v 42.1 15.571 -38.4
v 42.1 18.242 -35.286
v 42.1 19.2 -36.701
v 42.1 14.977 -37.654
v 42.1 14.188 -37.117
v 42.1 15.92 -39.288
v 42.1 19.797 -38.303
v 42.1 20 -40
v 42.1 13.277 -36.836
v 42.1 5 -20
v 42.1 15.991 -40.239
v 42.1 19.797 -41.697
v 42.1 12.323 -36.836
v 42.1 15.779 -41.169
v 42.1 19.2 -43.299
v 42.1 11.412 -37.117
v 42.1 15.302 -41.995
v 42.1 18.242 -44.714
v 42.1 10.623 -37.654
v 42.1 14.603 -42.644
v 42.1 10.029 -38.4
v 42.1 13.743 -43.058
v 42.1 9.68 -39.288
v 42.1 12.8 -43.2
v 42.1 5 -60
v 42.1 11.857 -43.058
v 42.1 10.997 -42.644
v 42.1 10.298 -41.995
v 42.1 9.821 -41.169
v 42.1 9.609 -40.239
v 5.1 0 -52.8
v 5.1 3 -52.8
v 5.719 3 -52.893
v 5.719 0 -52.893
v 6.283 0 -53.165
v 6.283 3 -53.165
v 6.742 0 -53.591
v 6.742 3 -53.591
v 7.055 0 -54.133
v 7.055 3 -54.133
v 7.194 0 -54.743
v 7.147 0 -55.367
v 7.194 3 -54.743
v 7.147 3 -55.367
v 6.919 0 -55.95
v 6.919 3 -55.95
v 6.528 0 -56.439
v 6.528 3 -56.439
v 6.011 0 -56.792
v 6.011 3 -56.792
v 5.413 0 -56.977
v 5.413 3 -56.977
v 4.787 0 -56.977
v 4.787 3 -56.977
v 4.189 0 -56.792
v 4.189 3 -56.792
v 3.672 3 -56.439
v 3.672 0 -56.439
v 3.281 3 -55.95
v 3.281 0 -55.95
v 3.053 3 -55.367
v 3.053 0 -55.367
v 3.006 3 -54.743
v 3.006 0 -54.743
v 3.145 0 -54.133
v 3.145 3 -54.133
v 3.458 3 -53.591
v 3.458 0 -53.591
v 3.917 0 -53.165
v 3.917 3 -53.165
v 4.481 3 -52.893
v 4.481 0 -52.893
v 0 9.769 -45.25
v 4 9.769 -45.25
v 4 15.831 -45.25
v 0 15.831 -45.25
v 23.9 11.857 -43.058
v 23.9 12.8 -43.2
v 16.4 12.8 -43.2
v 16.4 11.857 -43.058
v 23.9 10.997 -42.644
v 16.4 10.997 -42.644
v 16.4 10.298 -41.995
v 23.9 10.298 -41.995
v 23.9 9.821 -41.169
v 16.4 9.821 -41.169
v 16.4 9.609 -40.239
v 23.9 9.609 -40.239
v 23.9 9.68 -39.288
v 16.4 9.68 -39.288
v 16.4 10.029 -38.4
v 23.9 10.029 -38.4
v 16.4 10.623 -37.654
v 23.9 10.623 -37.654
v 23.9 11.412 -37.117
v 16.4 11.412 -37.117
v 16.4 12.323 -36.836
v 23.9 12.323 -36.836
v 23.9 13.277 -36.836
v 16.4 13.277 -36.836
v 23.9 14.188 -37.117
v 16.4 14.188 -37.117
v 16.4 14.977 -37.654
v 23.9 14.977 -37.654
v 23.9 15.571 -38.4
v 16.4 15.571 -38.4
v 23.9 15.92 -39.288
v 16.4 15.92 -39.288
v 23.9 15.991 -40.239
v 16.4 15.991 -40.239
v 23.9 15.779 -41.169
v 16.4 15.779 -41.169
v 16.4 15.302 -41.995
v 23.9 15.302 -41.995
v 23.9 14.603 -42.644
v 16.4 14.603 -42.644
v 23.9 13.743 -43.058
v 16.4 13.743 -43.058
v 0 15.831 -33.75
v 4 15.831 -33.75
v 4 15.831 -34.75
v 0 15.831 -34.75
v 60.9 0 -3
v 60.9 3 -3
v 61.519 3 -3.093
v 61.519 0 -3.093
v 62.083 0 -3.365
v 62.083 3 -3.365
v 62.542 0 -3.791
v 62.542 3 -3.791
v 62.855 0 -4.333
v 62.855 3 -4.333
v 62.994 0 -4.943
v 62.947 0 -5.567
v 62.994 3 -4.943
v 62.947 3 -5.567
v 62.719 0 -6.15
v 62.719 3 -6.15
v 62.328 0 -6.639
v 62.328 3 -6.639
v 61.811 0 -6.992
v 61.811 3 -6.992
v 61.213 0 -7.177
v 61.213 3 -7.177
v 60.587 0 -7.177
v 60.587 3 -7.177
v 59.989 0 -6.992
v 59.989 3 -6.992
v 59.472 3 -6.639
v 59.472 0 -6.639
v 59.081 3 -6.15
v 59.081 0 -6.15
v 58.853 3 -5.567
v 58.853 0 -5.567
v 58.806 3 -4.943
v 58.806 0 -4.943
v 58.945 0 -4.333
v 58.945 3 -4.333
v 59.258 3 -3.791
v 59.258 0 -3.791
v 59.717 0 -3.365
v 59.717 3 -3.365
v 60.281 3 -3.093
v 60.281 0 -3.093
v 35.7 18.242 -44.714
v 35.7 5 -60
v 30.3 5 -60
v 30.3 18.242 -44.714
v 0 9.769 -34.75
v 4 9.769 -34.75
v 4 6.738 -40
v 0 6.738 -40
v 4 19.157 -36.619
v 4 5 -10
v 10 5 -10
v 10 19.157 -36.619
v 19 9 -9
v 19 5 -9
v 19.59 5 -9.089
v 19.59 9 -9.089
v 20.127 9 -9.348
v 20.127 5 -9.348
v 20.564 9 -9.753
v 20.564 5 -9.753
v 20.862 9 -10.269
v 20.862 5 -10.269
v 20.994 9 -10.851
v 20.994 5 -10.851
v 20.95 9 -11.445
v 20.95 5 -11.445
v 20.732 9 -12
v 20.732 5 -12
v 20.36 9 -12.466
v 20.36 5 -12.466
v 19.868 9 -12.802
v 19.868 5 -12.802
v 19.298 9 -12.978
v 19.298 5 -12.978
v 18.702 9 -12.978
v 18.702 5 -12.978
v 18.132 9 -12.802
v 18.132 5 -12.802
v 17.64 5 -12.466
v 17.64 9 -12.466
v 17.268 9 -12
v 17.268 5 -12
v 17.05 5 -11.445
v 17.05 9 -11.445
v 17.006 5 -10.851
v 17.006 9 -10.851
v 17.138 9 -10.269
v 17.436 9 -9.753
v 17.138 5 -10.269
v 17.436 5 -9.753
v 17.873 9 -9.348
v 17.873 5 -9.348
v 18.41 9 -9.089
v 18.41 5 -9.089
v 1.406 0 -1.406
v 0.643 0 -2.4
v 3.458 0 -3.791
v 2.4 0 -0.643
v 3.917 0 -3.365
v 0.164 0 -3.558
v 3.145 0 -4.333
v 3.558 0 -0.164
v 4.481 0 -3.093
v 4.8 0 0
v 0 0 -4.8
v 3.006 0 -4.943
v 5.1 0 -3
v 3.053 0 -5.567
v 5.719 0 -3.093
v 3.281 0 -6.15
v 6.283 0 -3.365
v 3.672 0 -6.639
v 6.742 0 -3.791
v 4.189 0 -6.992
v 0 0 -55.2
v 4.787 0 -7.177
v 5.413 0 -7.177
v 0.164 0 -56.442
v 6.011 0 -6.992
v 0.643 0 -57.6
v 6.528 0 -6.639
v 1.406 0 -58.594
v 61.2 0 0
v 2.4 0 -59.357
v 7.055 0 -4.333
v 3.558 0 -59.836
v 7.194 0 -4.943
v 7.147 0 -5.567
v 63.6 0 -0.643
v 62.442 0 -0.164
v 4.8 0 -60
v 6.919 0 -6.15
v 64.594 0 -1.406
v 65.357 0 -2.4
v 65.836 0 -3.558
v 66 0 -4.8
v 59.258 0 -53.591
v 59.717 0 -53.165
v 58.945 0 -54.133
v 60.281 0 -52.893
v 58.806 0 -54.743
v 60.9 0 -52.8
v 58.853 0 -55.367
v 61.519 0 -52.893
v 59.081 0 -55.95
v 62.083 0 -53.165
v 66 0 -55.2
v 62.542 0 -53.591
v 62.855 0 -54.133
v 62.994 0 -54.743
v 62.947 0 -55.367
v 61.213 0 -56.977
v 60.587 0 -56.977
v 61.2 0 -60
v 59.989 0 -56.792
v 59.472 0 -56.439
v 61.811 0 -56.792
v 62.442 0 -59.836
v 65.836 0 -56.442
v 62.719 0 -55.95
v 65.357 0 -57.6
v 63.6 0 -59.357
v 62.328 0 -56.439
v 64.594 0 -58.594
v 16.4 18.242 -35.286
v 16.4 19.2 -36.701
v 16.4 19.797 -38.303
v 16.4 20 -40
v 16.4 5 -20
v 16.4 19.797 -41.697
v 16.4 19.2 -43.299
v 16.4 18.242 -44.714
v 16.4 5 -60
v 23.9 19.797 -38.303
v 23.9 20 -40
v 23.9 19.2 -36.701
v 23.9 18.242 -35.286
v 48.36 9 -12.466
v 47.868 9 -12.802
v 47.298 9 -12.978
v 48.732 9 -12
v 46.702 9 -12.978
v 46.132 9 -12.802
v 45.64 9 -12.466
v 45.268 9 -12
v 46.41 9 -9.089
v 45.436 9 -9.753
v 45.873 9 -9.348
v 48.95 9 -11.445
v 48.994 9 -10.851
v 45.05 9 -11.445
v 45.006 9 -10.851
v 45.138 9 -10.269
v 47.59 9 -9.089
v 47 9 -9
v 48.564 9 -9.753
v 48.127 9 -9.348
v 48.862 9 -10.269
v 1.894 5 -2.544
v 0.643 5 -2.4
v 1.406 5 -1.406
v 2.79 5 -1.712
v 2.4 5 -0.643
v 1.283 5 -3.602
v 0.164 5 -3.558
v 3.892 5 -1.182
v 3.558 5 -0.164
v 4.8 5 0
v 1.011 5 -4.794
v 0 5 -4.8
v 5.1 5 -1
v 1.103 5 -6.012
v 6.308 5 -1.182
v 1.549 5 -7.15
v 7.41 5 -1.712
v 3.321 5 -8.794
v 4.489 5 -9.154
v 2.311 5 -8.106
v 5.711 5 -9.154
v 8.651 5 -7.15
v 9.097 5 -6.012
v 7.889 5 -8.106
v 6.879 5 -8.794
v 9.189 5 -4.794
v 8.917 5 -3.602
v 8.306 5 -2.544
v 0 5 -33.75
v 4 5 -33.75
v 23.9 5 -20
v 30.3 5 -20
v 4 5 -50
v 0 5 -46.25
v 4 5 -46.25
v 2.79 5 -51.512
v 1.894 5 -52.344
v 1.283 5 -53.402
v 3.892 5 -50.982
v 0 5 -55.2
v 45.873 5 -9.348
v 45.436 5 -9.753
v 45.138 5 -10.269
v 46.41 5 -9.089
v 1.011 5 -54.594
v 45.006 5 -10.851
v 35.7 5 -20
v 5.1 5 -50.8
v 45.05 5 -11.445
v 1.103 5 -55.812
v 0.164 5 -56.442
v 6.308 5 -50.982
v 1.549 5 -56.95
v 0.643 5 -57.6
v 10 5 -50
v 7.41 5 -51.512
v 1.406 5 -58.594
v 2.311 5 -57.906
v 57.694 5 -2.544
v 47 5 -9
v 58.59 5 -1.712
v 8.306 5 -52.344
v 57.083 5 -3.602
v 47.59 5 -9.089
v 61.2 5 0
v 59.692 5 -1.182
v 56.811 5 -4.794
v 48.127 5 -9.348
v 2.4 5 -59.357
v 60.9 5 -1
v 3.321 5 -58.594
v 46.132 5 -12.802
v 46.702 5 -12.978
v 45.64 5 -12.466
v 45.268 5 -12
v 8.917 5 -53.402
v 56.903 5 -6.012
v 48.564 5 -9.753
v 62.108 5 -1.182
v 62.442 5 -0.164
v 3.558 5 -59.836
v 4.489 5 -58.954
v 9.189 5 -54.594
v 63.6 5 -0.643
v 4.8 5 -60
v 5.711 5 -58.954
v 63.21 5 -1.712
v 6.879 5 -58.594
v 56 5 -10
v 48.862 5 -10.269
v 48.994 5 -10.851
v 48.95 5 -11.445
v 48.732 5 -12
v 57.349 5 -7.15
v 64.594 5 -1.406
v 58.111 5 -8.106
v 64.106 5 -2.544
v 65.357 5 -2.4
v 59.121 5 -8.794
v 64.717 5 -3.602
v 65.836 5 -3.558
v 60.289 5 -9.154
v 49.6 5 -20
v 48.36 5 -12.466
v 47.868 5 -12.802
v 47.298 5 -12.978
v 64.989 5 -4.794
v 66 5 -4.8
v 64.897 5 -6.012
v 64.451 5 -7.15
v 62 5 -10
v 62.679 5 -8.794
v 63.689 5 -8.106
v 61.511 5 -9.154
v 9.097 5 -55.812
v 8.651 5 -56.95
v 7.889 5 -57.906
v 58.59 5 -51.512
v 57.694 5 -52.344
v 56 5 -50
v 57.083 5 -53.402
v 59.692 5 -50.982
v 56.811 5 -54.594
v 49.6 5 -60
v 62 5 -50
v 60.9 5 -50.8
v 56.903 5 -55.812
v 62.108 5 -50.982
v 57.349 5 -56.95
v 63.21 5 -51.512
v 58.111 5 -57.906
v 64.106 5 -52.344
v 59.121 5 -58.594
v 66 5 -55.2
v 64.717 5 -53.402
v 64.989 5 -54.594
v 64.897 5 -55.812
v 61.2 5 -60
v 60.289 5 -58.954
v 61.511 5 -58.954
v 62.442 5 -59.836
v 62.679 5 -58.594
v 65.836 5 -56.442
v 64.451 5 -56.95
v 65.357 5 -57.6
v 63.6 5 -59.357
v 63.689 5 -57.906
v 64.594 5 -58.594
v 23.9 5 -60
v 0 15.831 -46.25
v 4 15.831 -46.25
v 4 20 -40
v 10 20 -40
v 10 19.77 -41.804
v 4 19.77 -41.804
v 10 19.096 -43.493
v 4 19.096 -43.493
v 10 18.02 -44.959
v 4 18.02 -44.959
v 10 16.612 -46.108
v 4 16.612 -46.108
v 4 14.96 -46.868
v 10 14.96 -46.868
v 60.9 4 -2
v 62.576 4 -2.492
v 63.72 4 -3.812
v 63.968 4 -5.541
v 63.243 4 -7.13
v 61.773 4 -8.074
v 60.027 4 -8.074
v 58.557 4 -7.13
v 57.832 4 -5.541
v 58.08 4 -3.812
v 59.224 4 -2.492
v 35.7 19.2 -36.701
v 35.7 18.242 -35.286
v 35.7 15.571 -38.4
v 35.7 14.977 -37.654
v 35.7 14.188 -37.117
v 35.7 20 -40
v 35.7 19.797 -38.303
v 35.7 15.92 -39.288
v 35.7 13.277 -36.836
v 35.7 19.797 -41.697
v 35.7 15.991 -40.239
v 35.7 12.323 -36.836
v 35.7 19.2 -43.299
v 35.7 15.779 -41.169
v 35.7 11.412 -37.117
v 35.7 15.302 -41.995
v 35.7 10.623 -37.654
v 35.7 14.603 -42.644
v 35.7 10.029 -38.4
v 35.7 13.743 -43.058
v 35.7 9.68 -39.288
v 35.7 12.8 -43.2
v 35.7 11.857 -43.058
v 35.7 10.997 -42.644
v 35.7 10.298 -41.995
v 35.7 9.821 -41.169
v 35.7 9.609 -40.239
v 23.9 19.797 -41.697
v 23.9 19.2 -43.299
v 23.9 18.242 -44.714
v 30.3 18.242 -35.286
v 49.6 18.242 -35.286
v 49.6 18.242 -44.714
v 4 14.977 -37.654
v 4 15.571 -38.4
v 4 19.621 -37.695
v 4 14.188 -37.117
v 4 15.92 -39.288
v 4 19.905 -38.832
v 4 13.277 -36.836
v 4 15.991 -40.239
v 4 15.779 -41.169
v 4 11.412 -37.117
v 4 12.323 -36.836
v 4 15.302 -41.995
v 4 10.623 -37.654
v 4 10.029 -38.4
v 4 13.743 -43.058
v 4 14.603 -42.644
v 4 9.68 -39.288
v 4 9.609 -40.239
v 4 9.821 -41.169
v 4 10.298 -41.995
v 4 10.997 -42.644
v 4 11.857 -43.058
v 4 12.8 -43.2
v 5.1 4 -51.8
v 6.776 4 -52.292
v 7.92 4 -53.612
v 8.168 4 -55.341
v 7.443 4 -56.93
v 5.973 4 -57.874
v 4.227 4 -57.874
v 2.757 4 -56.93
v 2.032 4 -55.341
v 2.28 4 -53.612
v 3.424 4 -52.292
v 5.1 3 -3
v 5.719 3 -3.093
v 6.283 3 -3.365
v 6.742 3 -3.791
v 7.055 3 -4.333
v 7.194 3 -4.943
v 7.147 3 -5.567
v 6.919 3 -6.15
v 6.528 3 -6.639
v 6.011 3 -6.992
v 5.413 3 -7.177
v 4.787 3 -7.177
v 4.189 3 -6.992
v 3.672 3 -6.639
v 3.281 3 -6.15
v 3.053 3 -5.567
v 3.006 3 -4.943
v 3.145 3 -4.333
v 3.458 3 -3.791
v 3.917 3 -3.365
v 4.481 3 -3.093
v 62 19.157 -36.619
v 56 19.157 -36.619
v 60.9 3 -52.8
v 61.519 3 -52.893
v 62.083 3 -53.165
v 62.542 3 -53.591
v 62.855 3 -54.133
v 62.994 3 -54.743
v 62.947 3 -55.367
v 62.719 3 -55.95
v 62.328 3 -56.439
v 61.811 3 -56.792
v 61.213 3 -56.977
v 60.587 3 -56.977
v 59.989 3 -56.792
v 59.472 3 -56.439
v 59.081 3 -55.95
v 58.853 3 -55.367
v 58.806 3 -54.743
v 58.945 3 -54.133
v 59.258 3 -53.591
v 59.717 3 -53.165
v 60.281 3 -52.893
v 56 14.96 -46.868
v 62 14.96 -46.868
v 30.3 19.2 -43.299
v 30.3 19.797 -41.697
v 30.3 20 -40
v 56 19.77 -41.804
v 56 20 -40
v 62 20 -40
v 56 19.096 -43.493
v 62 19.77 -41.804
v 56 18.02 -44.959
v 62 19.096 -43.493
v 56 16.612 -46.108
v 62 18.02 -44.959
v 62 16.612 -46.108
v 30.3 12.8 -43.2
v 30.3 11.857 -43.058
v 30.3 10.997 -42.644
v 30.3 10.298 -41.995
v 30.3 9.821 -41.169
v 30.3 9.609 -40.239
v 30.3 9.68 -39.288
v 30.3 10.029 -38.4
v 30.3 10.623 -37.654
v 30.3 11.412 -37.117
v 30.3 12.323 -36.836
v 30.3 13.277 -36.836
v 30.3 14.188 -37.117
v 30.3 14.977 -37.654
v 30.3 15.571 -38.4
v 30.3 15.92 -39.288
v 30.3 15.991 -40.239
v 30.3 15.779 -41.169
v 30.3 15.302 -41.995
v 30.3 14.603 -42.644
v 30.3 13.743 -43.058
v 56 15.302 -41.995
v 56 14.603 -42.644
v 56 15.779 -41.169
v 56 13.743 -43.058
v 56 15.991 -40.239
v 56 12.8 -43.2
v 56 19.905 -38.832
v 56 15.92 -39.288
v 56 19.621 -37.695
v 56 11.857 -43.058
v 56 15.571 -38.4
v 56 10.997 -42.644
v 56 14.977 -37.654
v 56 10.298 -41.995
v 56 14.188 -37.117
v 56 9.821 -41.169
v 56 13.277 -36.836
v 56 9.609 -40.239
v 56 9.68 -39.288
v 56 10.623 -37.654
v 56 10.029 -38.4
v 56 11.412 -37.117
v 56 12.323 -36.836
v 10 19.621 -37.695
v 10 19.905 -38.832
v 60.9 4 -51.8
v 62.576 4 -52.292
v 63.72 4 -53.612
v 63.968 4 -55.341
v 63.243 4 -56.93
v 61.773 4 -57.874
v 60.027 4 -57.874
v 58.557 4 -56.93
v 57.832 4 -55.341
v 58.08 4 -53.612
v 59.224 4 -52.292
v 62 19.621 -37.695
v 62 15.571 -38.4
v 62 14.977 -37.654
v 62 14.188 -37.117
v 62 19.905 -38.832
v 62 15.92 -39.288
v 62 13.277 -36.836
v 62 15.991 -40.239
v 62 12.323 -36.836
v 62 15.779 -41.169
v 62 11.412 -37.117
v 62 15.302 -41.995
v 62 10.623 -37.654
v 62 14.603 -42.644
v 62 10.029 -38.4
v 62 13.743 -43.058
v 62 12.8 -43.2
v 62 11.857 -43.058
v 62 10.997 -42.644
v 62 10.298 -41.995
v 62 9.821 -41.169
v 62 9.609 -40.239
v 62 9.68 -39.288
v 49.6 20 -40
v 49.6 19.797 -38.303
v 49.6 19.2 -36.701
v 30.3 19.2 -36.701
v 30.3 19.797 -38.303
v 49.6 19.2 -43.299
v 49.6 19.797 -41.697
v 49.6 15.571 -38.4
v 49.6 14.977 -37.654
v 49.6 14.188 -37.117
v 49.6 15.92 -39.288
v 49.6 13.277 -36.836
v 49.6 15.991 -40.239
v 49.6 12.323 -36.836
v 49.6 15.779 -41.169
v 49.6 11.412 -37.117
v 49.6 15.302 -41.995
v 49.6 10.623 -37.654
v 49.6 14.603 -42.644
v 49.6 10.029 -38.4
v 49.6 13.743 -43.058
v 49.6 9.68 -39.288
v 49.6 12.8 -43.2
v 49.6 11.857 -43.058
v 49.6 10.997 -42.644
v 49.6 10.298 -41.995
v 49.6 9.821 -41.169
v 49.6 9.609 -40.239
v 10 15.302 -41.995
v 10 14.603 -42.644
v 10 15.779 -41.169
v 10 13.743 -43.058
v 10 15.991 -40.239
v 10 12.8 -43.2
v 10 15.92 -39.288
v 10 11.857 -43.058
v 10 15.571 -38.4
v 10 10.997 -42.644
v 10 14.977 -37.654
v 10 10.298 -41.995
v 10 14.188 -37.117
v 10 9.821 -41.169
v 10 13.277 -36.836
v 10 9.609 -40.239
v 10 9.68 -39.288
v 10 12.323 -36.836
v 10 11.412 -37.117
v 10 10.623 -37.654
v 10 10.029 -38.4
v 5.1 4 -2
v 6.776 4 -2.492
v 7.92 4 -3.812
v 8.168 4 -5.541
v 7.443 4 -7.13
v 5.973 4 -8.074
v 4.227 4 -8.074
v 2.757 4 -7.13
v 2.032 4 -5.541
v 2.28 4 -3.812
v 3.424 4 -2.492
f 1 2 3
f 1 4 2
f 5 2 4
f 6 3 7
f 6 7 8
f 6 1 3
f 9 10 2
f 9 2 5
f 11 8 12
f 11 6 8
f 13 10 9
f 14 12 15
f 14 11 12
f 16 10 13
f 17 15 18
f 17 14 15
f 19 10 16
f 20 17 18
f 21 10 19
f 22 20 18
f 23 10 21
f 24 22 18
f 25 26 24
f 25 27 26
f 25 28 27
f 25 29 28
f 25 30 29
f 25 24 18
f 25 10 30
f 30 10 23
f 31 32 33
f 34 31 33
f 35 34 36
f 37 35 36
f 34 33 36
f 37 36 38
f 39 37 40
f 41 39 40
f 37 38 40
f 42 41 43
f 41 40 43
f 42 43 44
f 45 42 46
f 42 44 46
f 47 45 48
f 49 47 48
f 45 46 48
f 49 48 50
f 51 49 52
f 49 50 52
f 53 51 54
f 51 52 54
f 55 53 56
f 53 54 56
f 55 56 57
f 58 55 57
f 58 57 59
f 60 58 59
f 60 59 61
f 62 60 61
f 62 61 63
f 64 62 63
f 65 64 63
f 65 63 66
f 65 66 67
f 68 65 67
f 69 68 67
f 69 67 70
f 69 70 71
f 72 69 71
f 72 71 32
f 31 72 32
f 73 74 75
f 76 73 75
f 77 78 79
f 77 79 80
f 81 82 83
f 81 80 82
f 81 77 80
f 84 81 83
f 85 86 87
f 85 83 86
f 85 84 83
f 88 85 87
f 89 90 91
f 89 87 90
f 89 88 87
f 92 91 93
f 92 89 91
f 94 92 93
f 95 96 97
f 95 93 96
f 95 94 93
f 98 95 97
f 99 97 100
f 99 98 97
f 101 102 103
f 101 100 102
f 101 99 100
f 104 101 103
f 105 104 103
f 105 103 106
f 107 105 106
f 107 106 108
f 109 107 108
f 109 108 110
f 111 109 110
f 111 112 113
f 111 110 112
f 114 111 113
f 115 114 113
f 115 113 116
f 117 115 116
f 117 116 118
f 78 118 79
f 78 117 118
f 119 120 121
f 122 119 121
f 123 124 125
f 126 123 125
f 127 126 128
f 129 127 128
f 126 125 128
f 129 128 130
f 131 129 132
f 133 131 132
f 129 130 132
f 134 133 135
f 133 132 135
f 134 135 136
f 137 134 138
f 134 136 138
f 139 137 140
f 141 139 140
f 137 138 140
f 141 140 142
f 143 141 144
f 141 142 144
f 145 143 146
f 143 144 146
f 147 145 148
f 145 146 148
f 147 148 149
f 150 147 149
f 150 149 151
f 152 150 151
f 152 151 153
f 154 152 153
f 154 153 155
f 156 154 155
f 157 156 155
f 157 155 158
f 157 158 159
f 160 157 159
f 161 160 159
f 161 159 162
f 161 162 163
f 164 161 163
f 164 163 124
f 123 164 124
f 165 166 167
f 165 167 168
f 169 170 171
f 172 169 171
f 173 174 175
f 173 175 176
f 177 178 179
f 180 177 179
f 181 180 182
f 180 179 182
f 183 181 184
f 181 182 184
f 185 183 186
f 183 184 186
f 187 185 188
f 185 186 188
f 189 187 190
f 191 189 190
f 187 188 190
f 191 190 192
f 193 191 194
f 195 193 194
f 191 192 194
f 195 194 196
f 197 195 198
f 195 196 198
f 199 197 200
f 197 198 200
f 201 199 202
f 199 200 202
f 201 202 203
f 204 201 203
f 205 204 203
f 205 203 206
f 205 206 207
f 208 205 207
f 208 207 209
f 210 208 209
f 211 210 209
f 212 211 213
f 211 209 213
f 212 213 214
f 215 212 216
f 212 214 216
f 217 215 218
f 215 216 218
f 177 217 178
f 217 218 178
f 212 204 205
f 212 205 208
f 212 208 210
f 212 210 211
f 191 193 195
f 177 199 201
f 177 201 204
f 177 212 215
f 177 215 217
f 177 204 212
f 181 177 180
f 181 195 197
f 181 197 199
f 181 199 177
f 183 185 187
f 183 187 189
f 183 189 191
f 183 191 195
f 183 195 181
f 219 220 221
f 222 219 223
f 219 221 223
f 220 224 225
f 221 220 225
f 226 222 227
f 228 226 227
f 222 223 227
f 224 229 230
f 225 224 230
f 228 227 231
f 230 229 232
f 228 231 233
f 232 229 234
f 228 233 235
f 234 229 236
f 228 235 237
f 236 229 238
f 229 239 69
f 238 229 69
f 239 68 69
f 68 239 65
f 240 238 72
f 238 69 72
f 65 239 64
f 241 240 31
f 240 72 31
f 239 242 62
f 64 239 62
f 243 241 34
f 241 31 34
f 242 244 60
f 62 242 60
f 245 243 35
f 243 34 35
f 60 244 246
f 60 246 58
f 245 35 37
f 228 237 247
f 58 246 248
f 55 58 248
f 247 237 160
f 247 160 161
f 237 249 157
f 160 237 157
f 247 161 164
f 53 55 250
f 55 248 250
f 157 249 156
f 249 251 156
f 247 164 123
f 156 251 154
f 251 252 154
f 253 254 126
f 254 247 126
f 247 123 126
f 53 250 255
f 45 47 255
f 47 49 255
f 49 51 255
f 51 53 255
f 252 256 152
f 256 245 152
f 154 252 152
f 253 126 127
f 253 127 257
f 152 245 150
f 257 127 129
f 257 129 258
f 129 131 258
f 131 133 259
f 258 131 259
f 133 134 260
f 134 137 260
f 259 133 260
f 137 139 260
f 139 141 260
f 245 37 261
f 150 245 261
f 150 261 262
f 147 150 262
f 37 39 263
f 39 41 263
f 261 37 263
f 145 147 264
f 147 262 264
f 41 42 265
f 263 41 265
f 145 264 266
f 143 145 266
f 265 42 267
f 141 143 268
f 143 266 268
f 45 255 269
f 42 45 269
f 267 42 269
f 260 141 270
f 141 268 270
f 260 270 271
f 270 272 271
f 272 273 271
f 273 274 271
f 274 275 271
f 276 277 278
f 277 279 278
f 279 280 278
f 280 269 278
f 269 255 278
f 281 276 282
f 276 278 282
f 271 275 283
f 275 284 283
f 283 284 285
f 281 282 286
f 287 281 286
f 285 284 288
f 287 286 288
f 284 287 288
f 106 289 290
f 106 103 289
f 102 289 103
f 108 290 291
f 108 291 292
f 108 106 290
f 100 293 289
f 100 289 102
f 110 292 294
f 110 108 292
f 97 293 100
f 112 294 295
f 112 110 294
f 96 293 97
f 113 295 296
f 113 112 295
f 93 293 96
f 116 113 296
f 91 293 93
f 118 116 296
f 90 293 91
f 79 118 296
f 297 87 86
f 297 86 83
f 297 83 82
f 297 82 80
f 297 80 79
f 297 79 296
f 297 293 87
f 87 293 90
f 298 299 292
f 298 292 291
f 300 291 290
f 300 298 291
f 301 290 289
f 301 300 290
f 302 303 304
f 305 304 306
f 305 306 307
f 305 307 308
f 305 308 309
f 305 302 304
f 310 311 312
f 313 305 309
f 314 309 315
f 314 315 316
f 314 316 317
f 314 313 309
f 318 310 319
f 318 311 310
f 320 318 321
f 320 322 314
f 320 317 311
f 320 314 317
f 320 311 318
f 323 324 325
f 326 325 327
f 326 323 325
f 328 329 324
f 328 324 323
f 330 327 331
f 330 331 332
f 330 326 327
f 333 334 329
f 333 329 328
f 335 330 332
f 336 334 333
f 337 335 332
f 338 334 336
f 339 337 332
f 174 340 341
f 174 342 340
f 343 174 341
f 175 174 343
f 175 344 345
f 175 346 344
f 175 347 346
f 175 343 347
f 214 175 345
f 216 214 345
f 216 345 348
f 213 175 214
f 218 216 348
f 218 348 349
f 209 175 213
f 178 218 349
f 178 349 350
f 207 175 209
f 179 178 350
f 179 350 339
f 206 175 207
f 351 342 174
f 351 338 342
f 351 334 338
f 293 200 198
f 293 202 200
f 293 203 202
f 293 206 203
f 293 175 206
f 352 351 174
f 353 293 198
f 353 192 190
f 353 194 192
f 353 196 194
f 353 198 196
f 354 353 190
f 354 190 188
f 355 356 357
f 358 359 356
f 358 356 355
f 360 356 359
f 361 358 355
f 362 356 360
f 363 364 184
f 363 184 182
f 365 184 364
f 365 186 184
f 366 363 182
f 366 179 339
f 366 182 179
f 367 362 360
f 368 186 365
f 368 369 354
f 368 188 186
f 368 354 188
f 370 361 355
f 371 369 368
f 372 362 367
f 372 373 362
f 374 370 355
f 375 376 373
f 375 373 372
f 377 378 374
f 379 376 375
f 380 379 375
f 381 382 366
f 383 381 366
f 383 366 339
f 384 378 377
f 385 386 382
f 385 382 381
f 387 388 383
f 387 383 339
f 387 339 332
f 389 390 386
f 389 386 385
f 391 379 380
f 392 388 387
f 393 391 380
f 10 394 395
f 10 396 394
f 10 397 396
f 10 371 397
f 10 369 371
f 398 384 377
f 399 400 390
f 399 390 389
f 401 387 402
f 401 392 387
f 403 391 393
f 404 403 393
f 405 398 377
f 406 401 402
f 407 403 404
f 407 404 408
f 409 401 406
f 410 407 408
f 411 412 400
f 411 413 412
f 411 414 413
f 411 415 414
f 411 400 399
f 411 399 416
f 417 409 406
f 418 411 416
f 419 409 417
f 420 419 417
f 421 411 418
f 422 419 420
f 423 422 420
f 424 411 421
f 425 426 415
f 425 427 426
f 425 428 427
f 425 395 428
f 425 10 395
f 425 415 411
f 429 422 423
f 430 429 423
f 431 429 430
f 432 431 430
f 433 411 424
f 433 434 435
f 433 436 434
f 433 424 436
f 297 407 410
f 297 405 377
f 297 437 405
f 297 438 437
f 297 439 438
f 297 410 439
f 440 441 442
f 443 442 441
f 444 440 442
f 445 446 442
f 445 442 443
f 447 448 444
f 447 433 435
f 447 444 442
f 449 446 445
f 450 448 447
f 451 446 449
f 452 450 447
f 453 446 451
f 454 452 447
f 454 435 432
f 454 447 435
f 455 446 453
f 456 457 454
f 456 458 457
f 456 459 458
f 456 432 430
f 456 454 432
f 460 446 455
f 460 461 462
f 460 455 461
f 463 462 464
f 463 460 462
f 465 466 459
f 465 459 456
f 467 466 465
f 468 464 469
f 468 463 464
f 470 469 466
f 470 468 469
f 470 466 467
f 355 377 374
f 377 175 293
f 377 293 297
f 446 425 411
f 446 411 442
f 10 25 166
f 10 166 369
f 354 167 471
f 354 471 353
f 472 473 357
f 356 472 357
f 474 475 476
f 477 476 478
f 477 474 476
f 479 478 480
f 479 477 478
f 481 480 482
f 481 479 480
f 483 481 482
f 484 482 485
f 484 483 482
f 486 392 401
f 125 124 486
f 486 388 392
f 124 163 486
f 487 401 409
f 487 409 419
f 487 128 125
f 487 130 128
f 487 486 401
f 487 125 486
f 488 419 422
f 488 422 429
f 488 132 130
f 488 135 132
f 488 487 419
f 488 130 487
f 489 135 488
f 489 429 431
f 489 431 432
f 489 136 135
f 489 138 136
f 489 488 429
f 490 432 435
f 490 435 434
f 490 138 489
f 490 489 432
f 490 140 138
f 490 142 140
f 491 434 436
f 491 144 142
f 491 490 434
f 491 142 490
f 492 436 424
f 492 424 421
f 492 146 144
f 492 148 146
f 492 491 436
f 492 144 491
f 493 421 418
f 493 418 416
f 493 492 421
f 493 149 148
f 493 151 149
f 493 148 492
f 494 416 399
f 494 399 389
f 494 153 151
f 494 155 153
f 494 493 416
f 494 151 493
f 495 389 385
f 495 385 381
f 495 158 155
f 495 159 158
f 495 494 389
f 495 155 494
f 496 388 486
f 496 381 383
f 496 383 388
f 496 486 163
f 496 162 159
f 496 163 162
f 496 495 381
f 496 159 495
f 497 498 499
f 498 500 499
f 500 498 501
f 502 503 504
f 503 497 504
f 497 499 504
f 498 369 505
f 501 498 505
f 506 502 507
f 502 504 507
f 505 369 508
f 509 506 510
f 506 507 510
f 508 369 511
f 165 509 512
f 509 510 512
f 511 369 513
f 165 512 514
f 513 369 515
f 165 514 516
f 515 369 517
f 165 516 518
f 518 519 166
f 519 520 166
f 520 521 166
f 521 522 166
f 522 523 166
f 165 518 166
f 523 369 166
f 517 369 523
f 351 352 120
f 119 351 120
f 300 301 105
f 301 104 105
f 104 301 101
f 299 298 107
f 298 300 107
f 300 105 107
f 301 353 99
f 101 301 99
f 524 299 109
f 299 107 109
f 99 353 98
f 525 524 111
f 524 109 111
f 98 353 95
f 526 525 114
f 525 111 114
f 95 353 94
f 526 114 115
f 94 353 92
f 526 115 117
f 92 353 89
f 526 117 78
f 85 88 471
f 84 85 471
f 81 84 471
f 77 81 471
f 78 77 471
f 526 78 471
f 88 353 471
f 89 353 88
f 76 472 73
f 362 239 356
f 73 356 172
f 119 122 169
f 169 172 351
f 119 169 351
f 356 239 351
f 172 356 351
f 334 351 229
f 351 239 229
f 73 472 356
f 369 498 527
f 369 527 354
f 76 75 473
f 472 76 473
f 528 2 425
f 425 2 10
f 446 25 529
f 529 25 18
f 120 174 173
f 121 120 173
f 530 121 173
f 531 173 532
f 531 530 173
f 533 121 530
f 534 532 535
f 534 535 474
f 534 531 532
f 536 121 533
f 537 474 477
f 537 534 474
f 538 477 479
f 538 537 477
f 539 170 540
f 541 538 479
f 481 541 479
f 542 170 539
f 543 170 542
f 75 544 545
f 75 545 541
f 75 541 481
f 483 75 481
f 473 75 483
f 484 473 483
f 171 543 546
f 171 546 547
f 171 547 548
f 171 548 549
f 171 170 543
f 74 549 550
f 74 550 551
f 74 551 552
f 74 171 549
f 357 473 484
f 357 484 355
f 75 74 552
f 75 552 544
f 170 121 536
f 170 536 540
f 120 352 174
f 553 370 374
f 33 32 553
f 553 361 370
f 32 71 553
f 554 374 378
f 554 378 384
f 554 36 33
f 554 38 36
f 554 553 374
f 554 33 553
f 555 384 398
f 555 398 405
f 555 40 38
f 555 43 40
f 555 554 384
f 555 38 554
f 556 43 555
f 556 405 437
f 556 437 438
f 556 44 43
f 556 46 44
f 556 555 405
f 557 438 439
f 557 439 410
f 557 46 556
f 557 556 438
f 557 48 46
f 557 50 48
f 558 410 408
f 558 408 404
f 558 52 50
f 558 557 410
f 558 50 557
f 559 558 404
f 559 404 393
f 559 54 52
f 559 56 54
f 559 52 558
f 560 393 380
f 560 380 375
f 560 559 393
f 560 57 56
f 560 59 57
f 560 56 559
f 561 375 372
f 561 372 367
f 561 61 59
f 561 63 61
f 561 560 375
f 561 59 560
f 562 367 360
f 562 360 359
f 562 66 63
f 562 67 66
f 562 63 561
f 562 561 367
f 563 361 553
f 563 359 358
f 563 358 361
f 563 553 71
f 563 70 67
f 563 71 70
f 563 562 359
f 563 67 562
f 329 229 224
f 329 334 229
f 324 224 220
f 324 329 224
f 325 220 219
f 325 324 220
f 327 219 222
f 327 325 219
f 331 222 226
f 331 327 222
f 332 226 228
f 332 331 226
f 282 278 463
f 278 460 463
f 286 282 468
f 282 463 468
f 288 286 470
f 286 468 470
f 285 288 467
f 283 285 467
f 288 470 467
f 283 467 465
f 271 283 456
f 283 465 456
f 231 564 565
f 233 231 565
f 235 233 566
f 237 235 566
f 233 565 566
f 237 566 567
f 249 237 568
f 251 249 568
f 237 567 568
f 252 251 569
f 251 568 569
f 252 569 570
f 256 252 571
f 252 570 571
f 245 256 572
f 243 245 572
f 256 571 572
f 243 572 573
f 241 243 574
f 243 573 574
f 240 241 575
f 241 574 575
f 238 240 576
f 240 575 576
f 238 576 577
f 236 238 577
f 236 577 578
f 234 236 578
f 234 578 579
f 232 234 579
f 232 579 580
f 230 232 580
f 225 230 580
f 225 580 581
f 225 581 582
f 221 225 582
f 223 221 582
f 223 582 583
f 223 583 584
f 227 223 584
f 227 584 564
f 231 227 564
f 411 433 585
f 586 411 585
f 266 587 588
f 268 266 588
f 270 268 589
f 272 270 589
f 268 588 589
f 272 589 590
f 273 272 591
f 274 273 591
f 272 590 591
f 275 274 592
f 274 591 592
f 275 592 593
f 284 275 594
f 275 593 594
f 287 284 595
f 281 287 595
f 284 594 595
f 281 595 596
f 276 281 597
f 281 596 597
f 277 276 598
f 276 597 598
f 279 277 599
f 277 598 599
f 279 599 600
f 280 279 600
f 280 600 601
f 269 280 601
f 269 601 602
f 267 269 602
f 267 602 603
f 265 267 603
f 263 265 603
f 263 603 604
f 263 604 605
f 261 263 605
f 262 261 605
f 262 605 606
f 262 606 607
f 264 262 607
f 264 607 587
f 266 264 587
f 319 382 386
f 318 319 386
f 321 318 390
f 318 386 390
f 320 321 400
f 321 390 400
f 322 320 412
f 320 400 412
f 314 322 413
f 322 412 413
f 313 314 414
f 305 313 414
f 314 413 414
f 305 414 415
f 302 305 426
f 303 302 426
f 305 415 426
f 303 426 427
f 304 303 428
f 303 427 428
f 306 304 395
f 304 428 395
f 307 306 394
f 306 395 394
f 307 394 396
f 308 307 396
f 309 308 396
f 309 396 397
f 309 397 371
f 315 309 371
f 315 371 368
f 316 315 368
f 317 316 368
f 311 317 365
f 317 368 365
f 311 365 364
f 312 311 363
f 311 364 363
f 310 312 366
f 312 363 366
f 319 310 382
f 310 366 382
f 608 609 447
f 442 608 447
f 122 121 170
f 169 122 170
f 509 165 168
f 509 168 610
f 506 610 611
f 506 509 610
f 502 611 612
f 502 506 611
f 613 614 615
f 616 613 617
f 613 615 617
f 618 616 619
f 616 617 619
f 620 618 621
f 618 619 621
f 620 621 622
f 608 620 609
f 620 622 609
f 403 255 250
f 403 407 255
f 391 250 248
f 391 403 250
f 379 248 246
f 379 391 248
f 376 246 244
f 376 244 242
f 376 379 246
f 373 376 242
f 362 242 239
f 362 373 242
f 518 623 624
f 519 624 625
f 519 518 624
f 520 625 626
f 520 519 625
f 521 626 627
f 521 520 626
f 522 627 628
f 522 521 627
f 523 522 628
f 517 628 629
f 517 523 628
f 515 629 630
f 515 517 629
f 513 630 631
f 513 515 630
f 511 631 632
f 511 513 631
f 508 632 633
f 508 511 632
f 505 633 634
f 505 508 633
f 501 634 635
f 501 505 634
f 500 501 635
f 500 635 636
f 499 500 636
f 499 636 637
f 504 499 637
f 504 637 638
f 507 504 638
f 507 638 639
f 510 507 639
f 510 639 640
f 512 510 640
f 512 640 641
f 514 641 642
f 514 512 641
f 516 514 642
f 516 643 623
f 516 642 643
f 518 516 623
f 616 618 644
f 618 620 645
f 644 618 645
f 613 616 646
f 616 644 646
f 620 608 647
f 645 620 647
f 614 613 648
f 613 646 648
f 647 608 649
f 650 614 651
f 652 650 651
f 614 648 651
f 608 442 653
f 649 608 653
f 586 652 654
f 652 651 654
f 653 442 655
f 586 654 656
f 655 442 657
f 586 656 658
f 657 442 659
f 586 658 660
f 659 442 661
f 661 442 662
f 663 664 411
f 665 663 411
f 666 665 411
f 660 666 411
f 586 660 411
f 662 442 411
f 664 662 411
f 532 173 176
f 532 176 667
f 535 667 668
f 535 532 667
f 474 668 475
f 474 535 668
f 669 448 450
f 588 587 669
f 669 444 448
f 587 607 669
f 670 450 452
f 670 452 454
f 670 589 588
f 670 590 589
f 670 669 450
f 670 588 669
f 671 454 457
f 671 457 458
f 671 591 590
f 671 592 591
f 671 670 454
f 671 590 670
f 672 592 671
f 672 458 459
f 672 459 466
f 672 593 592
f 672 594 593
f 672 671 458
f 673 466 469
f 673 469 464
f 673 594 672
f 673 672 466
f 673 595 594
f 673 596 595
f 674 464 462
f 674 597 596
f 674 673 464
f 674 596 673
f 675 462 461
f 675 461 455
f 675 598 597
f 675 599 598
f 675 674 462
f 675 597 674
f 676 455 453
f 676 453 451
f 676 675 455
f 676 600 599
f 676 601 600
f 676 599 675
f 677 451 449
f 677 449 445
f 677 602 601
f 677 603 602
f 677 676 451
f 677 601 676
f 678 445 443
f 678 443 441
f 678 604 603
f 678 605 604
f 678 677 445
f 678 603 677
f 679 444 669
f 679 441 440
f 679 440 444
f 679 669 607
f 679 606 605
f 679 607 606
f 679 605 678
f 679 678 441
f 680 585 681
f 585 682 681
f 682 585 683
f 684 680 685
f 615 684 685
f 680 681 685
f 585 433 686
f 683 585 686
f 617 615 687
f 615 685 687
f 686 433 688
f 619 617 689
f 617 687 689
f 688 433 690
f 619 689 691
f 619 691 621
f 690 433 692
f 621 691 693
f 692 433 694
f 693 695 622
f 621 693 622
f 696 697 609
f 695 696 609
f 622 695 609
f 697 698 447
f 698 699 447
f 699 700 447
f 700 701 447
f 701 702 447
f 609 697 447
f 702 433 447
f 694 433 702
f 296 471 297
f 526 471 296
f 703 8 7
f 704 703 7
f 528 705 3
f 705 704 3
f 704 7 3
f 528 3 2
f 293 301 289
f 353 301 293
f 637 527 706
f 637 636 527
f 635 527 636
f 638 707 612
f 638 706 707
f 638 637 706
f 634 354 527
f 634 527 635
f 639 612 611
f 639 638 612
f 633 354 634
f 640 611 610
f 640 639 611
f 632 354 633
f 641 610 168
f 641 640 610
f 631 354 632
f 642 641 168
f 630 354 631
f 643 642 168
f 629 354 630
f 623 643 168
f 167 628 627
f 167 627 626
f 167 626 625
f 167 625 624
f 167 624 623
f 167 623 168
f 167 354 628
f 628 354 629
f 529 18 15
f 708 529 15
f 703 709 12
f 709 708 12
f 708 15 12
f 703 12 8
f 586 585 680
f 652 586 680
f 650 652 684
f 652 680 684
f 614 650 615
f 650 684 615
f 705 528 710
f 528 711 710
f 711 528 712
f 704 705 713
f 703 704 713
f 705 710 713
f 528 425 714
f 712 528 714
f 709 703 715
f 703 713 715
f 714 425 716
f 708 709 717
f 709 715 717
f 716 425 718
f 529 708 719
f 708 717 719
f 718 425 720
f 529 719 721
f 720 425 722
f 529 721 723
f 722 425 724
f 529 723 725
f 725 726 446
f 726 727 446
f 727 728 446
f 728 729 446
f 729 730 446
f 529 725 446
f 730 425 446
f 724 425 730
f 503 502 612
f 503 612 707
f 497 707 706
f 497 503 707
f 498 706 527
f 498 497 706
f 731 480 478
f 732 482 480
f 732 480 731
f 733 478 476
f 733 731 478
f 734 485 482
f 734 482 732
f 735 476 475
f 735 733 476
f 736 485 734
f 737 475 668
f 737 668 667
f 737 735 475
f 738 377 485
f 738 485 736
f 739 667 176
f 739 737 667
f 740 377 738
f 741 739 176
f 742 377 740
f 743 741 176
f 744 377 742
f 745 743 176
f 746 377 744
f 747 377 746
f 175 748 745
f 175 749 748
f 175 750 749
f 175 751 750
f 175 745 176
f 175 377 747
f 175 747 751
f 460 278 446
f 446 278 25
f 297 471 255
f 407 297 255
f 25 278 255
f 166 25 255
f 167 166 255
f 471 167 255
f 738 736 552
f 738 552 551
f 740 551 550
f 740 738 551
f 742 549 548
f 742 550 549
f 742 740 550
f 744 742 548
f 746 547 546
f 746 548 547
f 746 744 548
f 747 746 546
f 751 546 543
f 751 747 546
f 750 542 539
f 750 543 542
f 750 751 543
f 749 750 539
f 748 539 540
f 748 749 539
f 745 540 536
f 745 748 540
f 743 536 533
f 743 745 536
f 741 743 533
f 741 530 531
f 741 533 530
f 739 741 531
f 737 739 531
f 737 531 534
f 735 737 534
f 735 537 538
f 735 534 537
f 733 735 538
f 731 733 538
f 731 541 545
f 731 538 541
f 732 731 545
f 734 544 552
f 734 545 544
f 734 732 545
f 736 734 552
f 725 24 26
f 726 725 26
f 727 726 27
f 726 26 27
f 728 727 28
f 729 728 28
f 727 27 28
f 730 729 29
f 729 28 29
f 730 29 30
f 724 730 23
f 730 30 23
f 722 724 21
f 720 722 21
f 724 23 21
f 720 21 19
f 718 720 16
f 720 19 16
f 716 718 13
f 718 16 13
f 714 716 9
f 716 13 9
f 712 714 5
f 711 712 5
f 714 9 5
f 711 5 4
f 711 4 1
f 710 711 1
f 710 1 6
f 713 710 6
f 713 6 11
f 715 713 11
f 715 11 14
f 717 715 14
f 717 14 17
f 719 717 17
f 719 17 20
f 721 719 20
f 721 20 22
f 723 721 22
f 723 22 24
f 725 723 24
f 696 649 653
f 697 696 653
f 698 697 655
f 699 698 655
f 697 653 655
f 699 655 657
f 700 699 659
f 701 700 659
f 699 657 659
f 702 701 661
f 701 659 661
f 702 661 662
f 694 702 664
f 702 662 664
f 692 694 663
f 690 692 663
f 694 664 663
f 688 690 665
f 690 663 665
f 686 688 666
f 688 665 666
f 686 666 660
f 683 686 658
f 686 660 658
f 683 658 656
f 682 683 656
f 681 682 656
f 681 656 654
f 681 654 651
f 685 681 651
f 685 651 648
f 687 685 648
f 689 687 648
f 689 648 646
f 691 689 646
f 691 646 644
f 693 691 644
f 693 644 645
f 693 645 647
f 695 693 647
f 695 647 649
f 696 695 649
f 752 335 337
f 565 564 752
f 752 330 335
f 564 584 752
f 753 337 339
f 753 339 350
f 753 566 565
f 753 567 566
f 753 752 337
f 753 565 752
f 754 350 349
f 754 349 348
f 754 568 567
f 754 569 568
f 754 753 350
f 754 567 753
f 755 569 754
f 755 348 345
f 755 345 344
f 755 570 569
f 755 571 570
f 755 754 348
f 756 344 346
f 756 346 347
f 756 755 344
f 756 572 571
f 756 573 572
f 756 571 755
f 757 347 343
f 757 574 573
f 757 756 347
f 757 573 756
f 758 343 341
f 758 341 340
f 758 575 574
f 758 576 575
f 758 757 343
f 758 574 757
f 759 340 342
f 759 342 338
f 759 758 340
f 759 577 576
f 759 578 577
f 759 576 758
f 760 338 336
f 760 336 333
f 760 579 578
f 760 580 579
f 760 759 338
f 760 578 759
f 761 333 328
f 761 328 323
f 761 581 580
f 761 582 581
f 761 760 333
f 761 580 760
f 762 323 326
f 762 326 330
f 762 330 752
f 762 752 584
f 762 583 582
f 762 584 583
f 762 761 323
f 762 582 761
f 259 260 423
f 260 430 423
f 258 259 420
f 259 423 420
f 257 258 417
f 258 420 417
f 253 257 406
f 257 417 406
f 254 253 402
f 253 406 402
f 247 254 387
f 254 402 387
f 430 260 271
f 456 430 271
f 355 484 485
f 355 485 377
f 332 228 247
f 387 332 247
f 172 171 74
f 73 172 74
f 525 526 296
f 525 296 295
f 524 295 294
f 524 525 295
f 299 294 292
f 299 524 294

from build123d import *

# Parameters (mm, degrees)
SKETCH4_W           = 6.4
SKETCH4_H           = 40
SKETCH4_W_2         = 5.4
SKETCH4_W_3         = 7.5
BOSS_EXTRUDE4_DEPTH = 5
SKETCH6_W           = 5.4
SKETCH6_H           = 40
SKETCH6_W_2         = 7.5
BOSS_EXTRUDE5_DEPTH = 15
SKETCH7_R           = 3.2
CUT_EXTRUDE2_DEPTH  = 73.625684162
CUT_EXTRUDE3_REACH  = 74.626
CUT_EXTRUDE4_REACH  = 90.566
CUT_EXTRUDE5_REACH  = 92.449
SKETCH10_R          = 2.1
CHAMFER1_SIZE       = 2
FILLET1_R           = 4.8
SKETCH11_R          = 2
BOSS_EXTRUDE6_DEPTH = 4
BOSS_EXTRUDE7_DEPTH = 4


with BuildPart() as part:
    # Sketch4 → Boss-Extrude4 (new body)
    with BuildSketch(Plane(origin=(0, 0, 0), x_dir=(1, 0, 0), z_dir=(0, 1, 0))):
        Polygon((0, 60), (0, 0), (66, 0), (66, 60), (56, 60), (56, 50), (62, 50), (62, 10), (56, 10), (56, 20), (49.6, 20), (42.1, 20), (35.7, 20), (30.3, 20), (30.3, 60), align=None)
        with Locations((38.9, 40)):
            Rectangle(SKETCH4_W, SKETCH4_H)
        with Locations((33, 40)):
            Rectangle(SKETCH4_W_2, SKETCH4_H)
        with Locations((45.85, 40)):
            Rectangle(SKETCH4_W_3, SKETCH4_H)
        Polygon((56, 50), (56, 60), (49.6, 60), (49.6, 20), (56, 20), align=None)
        Polygon((62, 50), (56, 50), (56, 20), (56, 10), (62, 10), align=None)
    extrude(amount=BOSS_EXTRUDE4_DEPTH)

    # Sketch6 → Boss-Extrude5 (add)
    with BuildSketch(Plane(origin=(0, 5, 0), x_dir=(1, 0, 0), z_dir=(0, 1, 0))):
        with Locations((33, 40)):
            Rectangle(SKETCH6_W, SKETCH6_H)
        with Locations((45.85, 40)):
            Rectangle(SKETCH6_W_2, SKETCH6_H)
        Polygon((62, 50), (56, 50), (56, 20), (56, 10), (62, 10), align=None)
    boss_extrude5 = extrude(amount=BOSS_EXTRUDE5_DEPTH)

    # Sketch7 → Cut-Extrude2 (cut, through all)
    with BuildSketch(Plane.ZY.offset(-30.3)):
        with Locations(Location((-40, 12.8, 0), (0, 0, 180))):
            Circle(SKETCH7_R)
    cut_extrude2 = extrude(amount=-CUT_EXTRUDE2_DEPTH, mode=Mode.SUBTRACT)

    # Cut-Extrude3: up to this face of the body (flat: up to its plane)
    cut_extrude3_end = Plane(part.part.faces().sort_by_distance((49.6, 12.5, -20.427200187))[0])
    # Sketch8 → Cut-Extrude3 (cut, up to the picked face)
    with BuildSketch(Plane.ZY.offset(-30.3), mode=Mode.PRIVATE) as cut_extrude3_sk1:
        with BuildLine():
            Line((-60, 20), (-60, 5))
            Line((-60, 5), (-44.714360106, 18.241948989))
            ThreePointArc((-44.714360106, 18.241948989), (-42.515747134, 19.546185319), (-40, 20))
            Line((-40, 20), (-60, 20))
        make_face()
    cut_extrude3_tool1 = split(extrude(cut_extrude3_sk1.sketch, amount=-CUT_EXTRUDE3_REACH, mode=Mode.PRIVATE), bisect_by=cut_extrude3_end, keep=Keep.BOTH, mode=Mode.PRIVATE)
    # Sketch8 → Cut-Extrude3 (cut, up to the picked face)
    with BuildSketch(Plane.ZY.offset(-30.3), mode=Mode.PRIVATE) as cut_extrude3_sk2:
        with BuildLine():
            Line((-35.285639894, 18.241948989), (-20, 5))
            Line((-20, 5), (-20, 20))
            Line((-20, 20), (-40, 20))
            ThreePointArc((-40, 20), (-37.484252866, 19.546185319), (-35.285639894, 18.241948989))
        make_face()
    cut_extrude3_tool2 = split(extrude(cut_extrude3_sk2.sketch, amount=-CUT_EXTRUDE3_REACH, mode=Mode.PRIVATE), bisect_by=cut_extrude3_end, keep=Keep.BOTH, mode=Mode.PRIVATE)
    cut_extrude3_1 = cut_extrude3_tool1.solids().sort_by(Axis((30.3, 15.029403, -54.154339), (1, 0, 0)))[0]
    add(cut_extrude3_1, mode=Mode.SUBTRACT)
    cut_extrude3_2 = cut_extrude3_tool2.solids().sort_by(Axis((30.3, 15.029403, -25.845661), (1, 0, 0)))[0]
    add(cut_extrude3_2, mode=Mode.SUBTRACT)
    cut_extrude3 = cut_extrude3_1 + cut_extrude3_2  # Cut-Extrude3 as one shape, for the pattern or mirror that repeats it

    # Sketch9 → Cut-Extrude4 (cut, up to next)
    with BuildSketch(Plane(origin=(62, 0, 0), x_dir=(0, 0, -1), z_dir=(1, 0, 0)), mode=Mode.PRIVATE) as cut_extrude4_sk1:
        with BuildLine():
            ThreePointArc((36.619205024, 19.156903753), (38.257832819, 19.786047059), (40, 20))
            Line((40, 20), (10, 20))
            Line((10, 20), (10, 5))
            Line((10, 5), (36.619205024, 19.156903753))
        make_face()
    cut_extrude4_tool1 = extrude(cut_extrude4_sk1.sketch, amount=-CUT_EXTRUDE4_REACH, mode=Mode.PRIVATE) & part.part
    # Sketch9 → Cut-Extrude4 (cut, up to next)
    with BuildSketch(Plane(origin=(62, 0, 0), x_dir=(0, 0, -1), z_dir=(1, 0, 0)), mode=Mode.PRIVATE) as cut_extrude4_sk2:
        with BuildLine():
            ThreePointArc((40, 20), (44.259746459, 18.604701552), (46.868488023, 14.959600029))
            Line((46.868488023, 14.959600029), (50, 5))
            Line((50, 5), (50, 20))
            Line((50, 20), (40, 20))
        make_face()
    cut_extrude4_tool2 = extrude(cut_extrude4_sk2.sketch, amount=-CUT_EXTRUDE4_REACH, mode=Mode.PRIVATE) & part.part
    cut_extrude4_1 = cut_extrude4_tool1.solids().sort_by_distance((62, 15.005893, -19.424487))[0]
    add(cut_extrude4_1, mode=Mode.SUBTRACT)
    cut_extrude4_2 = cut_extrude4_tool2.solids().sort_by_distance((62, 15.504148, -47.92116))[0]
    add(cut_extrude4_2, mode=Mode.SUBTRACT)
    cut_extrude4 = cut_extrude4_1 + cut_extrude4_2  # Cut-Extrude4 as one shape, for the pattern or mirror that repeats it

    # Mirror1: Boss-Extrude5, Cut-Extrude2, Cut-Extrude3, Cut-Extrude4 across plane
    add(boss_extrude5.mirror(Plane.ZY.offset(-33)))
    add(cut_extrude2.mirror(Plane.ZY.offset(-33)), mode=Mode.SUBTRACT)
    add(cut_extrude3.mirror(Plane.ZY.offset(-33)), mode=Mode.SUBTRACT)
    add(cut_extrude4.mirror(Plane.ZY.offset(-33)), mode=Mode.SUBTRACT)

    # Sketch10 → Cut-Extrude5 (cut, up to next)
    with BuildSketch(Plane(origin=(0, 5, 0), x_dir=(1, 0, 0), z_dir=(0, 1, 0)), mode=Mode.PRIVATE) as cut_extrude5_sk1:
        with Locations(Location((5.1, 54.9, 0), (0, 0, 270))):
            Circle(SKETCH10_R)
    cut_extrude5_tool1 = extrude(cut_extrude5_sk1.sketch, amount=-CUT_EXTRUDE5_REACH, mode=Mode.PRIVATE) & part.part
    # Sketch10 → Cut-Extrude5 (cut, up to next)
    with BuildSketch(Plane(origin=(0, 5, 0), x_dir=(1, 0, 0), z_dir=(0, 1, 0)), mode=Mode.PRIVATE) as cut_extrude5_sk2:
        with Locations(Location((60.9, 54.9, 0), (0, 0, 270))):
            Circle(SKETCH10_R)
    cut_extrude5_tool2 = extrude(cut_extrude5_sk2.sketch, amount=-CUT_EXTRUDE5_REACH, mode=Mode.PRIVATE) & part.part
    # Sketch10 → Cut-Extrude5 (cut, up to next)
    with BuildSketch(Plane(origin=(0, 5, 0), x_dir=(1, 0, 0), z_dir=(0, 1, 0)), mode=Mode.PRIVATE) as cut_extrude5_sk3:
        with Locations(Location((60.9, 5.1, 0), (0, 0, 270))):
            Circle(SKETCH10_R)
    cut_extrude5_tool3 = extrude(cut_extrude5_sk3.sketch, amount=-CUT_EXTRUDE5_REACH, mode=Mode.PRIVATE) & part.part
    # Sketch10 → Cut-Extrude5 (cut, up to next)
    with BuildSketch(Plane(origin=(0, 5, 0), x_dir=(1, 0, 0), z_dir=(0, 1, 0)), mode=Mode.PRIVATE) as cut_extrude5_sk4:
        with Locations(Location((5.1, 5.1, 0), (0, 0, 270))):
            Circle(SKETCH10_R)
    cut_extrude5_tool4 = extrude(cut_extrude5_sk4.sketch, amount=-CUT_EXTRUDE5_REACH, mode=Mode.PRIVATE) & part.part
    add(cut_extrude5_tool1.solids().sort_by_distance((5.1, 5, -54.9))[0], mode=Mode.SUBTRACT)
    add(cut_extrude5_tool2.solids().sort_by_distance((60.9, 5, -54.9))[0], mode=Mode.SUBTRACT)
    add(cut_extrude5_tool3.solids().sort_by_distance((60.9, 5, -5.1))[0], mode=Mode.SUBTRACT)
    add(cut_extrude5_tool4.solids().sort_by_distance((5.1, 5, -5.1))[0], mode=Mode.SUBTRACT)

    # Chamfer1
    chamfer1_edges = [part.edges().sort_by_distance(p)[0] for p in [
        (5.1, 5, -7.2),
        (60.9, 5, -7.2),
        (60.9, 5, -57),
        (5.1, 5, -57),
    ]]
    chamfer(chamfer1_edges, length=CHAMFER1_SIZE)

    # Fillet1
    fillet1_edges = [part.edges().sort_by_distance(p)[0] for p in [
        (66, 2.5, 0),
        (0, 2.5, 0),
        (0, 2.5, -60),
        (66, 2.5, -60),
    ]]
    fillet(fillet1_edges, radius=FILLET1_R)

    # Sketch11 → Boss-Extrude6 (add)
    with BuildSketch(Plane(origin=(0, 5, 0), x_dir=(1, 0, 0), z_dir=(0, 1, 0))):
        with Locations(Location((19, 11, 0), (0, 0, 270))):
            Circle(SKETCH11_R)
        with Locations(Location((47, 11, 0), (0, 0, 270))):
            Circle(SKETCH11_R)
    extrude(amount=BOSS_EXTRUDE6_DEPTH)

    # Sketch12 → Boss-Extrude7 (add)
    with BuildSketch(Plane.ZY.offset(-4)):
        Polygon((-45.25, 9.768911087), (-45.25, 15.831088913), (-46.25, 15.831088913), (-46.25, 5), (-33.75, 5), (-33.75, 15.831088913), (-34.75, 15.831088913), (-34.75, 9.768911087), (-40, 6.737822174), align=None)
    extrude(amount=BOSS_EXTRUDE7_DEPTH)


solid = part.part
